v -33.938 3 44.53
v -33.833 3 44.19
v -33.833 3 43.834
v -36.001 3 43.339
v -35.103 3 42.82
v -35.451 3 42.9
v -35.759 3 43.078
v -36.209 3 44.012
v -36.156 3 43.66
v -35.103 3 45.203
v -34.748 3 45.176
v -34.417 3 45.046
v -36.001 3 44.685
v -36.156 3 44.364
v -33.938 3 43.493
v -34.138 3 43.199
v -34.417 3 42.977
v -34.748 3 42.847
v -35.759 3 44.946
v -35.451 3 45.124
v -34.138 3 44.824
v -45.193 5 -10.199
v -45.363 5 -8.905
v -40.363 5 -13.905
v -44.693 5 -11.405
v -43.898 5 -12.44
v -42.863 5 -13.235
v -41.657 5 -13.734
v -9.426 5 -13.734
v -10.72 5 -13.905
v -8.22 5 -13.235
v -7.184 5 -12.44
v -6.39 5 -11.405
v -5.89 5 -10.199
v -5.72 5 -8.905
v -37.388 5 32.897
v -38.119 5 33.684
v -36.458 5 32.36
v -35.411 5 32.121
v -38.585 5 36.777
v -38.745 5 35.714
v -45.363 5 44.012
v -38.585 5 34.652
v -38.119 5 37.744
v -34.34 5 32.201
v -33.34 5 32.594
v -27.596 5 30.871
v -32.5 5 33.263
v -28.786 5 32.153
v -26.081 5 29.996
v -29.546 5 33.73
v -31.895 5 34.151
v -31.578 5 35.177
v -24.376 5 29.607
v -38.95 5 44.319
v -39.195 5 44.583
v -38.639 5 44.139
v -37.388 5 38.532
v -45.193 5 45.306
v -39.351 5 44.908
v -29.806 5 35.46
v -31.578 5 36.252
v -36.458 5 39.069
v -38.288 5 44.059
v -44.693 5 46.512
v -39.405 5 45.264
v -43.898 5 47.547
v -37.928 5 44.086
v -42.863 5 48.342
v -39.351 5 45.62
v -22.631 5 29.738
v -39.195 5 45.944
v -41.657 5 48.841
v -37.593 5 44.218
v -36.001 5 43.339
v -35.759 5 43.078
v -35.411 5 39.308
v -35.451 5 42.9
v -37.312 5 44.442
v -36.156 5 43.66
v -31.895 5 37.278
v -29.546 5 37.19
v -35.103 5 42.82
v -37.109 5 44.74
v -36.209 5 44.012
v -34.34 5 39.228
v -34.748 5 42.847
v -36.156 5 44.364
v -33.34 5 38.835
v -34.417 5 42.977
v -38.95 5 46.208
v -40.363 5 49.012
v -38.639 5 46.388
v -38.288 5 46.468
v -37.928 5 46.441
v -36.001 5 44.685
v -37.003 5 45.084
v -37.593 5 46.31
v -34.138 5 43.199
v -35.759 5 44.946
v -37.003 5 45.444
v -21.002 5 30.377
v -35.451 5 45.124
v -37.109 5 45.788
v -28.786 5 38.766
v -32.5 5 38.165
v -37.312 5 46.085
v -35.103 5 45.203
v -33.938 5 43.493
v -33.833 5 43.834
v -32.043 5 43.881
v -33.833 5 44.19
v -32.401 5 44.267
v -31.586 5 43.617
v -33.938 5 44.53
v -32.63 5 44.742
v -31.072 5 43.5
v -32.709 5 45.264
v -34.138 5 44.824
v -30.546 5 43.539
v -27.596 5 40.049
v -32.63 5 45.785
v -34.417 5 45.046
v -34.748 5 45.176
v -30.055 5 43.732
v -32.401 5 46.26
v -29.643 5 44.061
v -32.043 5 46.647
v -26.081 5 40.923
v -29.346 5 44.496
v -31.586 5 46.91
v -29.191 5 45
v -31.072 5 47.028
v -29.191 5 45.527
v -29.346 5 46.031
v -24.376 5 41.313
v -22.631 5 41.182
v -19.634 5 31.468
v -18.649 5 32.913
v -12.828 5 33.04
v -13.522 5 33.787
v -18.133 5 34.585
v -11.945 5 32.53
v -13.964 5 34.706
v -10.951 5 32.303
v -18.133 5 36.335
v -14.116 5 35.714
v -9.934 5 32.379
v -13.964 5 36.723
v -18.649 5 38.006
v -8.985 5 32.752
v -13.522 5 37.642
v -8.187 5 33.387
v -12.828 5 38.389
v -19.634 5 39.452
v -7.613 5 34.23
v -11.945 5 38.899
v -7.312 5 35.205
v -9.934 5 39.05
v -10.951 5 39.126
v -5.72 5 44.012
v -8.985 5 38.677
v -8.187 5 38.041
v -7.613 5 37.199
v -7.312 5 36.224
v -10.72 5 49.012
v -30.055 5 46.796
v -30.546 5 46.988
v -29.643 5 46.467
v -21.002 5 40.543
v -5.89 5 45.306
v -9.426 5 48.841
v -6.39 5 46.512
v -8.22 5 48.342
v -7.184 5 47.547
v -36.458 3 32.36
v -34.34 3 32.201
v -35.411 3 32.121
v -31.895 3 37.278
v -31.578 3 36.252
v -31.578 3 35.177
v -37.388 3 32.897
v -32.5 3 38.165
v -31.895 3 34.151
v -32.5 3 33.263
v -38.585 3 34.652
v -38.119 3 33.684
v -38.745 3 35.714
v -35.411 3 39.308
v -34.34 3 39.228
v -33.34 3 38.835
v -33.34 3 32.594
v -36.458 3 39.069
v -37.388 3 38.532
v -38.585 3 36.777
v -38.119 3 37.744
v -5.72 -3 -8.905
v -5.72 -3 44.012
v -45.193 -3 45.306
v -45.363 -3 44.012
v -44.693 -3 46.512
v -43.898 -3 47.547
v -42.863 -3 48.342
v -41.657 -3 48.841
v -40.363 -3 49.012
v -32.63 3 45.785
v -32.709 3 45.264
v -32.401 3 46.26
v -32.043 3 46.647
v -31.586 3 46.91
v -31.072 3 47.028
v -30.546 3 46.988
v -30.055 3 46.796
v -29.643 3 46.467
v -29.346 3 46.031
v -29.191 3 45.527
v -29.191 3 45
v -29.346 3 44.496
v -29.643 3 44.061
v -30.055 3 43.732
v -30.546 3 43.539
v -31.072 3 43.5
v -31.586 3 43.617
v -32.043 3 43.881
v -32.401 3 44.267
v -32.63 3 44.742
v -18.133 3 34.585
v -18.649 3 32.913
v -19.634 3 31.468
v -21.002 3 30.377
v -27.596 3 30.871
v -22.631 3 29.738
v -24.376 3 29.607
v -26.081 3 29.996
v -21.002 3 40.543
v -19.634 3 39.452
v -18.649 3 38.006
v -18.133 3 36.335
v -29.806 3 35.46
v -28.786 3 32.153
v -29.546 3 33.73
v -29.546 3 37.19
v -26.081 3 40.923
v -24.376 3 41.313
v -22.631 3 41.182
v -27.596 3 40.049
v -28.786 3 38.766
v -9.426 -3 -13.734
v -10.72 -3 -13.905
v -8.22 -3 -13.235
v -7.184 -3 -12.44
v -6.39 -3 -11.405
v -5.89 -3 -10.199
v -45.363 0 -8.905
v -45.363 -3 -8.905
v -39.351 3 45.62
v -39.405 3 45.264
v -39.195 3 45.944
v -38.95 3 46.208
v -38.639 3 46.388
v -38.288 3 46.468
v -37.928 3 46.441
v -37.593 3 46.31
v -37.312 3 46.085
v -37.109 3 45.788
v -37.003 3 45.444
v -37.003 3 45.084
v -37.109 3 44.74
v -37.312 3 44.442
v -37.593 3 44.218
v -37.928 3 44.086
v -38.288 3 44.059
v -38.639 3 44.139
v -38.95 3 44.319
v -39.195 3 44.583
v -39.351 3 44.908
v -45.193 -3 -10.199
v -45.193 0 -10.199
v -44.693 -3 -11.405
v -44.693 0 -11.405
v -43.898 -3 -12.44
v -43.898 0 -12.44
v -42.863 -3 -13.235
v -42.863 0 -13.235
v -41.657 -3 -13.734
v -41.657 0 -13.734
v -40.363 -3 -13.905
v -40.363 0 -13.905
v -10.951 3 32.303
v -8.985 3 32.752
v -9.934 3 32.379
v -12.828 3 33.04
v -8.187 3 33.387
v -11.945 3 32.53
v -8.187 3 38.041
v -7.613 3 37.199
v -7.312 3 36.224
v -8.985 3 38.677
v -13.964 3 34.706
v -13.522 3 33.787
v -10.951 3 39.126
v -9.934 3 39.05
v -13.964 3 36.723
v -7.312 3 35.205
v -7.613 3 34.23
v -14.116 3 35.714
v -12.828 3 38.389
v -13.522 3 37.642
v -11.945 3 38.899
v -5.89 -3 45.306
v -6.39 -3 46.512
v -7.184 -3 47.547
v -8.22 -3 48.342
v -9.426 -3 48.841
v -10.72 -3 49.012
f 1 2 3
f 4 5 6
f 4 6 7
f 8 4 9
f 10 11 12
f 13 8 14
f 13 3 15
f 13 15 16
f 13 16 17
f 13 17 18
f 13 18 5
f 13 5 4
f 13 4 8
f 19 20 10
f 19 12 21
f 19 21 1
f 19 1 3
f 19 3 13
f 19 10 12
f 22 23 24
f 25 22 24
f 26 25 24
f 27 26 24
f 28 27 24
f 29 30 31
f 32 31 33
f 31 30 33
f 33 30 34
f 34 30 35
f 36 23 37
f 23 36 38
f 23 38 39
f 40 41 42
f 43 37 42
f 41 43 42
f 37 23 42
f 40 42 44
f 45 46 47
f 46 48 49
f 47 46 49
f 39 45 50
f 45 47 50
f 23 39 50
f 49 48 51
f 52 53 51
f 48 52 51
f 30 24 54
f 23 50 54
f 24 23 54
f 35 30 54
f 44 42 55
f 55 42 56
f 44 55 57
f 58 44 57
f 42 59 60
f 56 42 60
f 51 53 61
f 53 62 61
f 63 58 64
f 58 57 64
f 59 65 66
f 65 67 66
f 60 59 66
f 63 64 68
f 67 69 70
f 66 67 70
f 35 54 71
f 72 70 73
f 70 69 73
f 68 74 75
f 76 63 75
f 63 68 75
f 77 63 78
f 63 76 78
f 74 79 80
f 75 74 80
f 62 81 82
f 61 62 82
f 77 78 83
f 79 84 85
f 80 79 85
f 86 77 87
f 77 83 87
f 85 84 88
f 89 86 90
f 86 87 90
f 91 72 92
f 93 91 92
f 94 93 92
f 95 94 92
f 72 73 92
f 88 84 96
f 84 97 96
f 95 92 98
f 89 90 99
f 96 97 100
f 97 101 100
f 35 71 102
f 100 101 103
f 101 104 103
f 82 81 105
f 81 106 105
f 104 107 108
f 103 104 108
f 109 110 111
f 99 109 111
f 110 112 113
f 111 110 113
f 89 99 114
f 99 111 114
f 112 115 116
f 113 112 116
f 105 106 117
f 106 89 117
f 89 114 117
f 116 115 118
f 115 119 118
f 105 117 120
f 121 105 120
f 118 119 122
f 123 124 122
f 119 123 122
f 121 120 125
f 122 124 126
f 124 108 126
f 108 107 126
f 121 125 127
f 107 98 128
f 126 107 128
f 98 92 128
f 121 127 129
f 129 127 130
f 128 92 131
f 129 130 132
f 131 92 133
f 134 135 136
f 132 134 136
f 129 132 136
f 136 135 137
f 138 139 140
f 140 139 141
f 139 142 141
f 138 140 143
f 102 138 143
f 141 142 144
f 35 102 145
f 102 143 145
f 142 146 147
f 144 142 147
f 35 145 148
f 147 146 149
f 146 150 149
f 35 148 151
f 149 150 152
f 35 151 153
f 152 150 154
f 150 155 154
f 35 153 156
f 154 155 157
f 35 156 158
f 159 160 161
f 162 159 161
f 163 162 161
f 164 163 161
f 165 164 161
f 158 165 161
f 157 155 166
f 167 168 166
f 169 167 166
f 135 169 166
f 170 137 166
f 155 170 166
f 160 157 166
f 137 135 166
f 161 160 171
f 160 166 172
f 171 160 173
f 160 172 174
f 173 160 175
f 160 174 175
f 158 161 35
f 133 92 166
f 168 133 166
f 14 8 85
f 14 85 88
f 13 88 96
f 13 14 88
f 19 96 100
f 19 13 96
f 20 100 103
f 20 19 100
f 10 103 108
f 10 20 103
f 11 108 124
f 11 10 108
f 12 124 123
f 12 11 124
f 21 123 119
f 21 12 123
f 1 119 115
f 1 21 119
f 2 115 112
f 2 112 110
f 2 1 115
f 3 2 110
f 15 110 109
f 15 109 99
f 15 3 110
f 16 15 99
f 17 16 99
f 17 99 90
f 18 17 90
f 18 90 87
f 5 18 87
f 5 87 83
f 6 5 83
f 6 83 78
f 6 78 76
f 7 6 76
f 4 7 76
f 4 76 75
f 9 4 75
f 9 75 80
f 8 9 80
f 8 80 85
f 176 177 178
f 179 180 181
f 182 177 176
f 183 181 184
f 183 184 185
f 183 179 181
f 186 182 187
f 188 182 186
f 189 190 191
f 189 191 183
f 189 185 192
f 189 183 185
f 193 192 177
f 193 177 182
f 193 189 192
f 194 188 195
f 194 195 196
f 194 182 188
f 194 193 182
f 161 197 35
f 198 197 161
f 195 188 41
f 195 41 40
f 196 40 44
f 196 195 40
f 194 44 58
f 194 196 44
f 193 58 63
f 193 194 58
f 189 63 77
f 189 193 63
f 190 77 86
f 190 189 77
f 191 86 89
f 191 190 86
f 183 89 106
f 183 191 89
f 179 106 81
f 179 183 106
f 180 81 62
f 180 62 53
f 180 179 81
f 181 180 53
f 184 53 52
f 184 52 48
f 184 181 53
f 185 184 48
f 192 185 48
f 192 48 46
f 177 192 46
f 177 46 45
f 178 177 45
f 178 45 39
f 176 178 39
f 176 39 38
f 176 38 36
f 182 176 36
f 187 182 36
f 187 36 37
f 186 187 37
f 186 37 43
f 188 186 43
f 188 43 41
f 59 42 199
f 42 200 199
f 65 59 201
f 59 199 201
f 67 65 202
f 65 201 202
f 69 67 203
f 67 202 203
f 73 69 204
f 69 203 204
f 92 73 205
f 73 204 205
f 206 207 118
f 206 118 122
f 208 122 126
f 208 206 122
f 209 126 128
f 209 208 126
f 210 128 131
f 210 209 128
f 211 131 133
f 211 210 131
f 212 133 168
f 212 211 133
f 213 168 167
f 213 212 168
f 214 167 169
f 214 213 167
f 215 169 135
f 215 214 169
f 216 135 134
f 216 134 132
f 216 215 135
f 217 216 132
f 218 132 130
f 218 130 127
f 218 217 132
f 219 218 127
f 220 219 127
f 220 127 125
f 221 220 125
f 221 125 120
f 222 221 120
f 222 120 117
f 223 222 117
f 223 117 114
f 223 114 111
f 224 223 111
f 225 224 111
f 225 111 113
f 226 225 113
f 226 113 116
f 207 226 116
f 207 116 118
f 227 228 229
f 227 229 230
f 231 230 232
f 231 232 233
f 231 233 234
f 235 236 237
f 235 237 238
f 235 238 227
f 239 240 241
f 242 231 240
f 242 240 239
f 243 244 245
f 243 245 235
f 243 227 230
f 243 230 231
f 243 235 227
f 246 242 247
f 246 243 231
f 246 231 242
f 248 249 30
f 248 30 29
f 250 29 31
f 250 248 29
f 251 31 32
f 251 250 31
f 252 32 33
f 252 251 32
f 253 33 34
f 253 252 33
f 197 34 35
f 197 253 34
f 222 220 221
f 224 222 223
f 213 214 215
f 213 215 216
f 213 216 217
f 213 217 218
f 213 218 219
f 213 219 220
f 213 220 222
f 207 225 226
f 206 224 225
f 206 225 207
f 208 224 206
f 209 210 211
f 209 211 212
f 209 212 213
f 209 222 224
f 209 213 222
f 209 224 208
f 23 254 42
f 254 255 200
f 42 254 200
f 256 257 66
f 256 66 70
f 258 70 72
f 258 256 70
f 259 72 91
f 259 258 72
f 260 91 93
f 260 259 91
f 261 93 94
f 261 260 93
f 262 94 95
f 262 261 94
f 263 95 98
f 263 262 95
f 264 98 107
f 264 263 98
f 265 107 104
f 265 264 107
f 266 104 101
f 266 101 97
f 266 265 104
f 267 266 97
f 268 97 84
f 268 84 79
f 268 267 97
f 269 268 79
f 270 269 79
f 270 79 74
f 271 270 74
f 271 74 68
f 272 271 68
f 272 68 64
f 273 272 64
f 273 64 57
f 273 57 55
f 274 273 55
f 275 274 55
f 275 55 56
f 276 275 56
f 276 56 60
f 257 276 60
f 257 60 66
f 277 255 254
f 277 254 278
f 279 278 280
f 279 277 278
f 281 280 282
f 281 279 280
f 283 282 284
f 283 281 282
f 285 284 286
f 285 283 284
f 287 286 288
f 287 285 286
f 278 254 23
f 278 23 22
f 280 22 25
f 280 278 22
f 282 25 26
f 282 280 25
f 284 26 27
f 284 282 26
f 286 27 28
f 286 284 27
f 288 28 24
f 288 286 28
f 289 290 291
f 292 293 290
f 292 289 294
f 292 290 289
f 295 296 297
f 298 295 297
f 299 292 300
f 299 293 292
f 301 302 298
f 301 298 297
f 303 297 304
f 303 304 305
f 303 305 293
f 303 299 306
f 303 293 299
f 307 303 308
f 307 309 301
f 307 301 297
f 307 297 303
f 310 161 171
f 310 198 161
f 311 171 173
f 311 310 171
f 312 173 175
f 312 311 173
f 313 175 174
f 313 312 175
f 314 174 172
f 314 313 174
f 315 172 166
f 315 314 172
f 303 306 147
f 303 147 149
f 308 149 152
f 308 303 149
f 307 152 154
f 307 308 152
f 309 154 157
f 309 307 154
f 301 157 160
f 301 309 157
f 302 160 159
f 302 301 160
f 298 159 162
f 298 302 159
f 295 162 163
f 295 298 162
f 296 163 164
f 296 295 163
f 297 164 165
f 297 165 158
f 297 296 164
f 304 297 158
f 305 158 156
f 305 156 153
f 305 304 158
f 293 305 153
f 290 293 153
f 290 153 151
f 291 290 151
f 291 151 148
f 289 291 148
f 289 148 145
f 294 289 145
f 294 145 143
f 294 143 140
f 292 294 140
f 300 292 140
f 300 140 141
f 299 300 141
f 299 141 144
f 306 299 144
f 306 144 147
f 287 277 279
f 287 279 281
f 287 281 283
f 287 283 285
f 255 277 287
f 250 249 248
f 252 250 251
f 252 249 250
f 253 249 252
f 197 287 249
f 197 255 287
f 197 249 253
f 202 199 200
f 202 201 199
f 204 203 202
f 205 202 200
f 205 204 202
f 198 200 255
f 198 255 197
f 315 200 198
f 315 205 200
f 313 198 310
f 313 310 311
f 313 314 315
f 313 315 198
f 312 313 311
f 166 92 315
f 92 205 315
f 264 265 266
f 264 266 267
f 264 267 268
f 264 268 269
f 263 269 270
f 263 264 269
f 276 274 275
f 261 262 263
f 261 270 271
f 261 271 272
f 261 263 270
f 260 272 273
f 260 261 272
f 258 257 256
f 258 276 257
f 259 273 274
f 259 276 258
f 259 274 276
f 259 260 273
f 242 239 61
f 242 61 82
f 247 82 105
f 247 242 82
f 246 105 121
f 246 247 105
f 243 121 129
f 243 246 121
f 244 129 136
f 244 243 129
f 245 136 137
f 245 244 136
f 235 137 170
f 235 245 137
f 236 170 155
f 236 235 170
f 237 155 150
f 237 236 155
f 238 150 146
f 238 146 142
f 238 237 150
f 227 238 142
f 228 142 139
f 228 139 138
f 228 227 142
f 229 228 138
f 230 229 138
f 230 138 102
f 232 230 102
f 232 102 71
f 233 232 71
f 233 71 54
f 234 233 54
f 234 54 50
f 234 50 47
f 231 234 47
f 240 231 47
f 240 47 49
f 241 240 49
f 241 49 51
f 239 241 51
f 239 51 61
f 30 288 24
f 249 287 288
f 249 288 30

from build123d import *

# Parameters (mm, degrees)
F0_W     = 39.643229451
F0_H     = 62.91637104
F1_DEPTH = 3
F2_R     = 5
F3_R     = 1.2078964804
F3_R_2   = 1.1945278086
F3_R_3   = 1.7688403941
F3_R_4   = 5.8693557263
F3_R_5   = 3.6035226858
F3_R_6   = 3.4212098418
F5_DEPTH = 3
F6_DEPTH = 5


# Not quite as in the source:
# - the program builds the solid bodies; features that only make, move or delete a surface that nothing else refers to are left out


with BuildPart() as f1:
    # F0 (on Front) → F1 (new body)
    with BuildSketch(Plane.XZ):
        with Locations((-25.5412899423, 17.5534696318)):
            Rectangle(F0_W, F0_H)
    extrude(amount=F1_DEPTH)

    # F2
    f2_edges = [f1.edges().sort_by_distance(p)[0] for p in [
        (-45.362905, -1.5, 49.011655),
        (-45.362905, -1.5, -13.904716),
        (-5.719675, -1.5, -13.904716),
        (-5.719675, -1.5, 49.011655),
    ]]
    fillet(f2_edges, radius=F2_R)

    # F3 (on face) → F5 (join)
    with BuildSketch(Plane(origin=(0, 0, 0), x_dir=(-1, 0, 0), z_dir=(0, 1, 0))):
        with Locations((38.1972528994, 45.2637411654)):
            Circle(F3_R)
        with Locations((35.0141488016, 44.0116551518)):
            Circle(F3_R_2)
        with Locations((30.9397745878, 45.2637411654)):
            Circle(F3_R_3)
        with Locations((23.9369440824, 35.4597829282)):
            Circle(F3_R_4)
        with Locations((35.1414717734, 35.7144325972)):
            Circle(F3_R_5)
        with Locations((10.6952302158, 35.7144325972)):
            Circle(F3_R_6)
    extrude(amount=F5_DEPTH)

    # F6 (add): a face of the model
    f6_faces = [f1.faces().sort_by_distance(p)[0] for p in [
        (-25.6181685943, 0, 15.8495495724),
    ]]
    extrude(f6_faces, amount=F6_DEPTH)


solid = f1.part
